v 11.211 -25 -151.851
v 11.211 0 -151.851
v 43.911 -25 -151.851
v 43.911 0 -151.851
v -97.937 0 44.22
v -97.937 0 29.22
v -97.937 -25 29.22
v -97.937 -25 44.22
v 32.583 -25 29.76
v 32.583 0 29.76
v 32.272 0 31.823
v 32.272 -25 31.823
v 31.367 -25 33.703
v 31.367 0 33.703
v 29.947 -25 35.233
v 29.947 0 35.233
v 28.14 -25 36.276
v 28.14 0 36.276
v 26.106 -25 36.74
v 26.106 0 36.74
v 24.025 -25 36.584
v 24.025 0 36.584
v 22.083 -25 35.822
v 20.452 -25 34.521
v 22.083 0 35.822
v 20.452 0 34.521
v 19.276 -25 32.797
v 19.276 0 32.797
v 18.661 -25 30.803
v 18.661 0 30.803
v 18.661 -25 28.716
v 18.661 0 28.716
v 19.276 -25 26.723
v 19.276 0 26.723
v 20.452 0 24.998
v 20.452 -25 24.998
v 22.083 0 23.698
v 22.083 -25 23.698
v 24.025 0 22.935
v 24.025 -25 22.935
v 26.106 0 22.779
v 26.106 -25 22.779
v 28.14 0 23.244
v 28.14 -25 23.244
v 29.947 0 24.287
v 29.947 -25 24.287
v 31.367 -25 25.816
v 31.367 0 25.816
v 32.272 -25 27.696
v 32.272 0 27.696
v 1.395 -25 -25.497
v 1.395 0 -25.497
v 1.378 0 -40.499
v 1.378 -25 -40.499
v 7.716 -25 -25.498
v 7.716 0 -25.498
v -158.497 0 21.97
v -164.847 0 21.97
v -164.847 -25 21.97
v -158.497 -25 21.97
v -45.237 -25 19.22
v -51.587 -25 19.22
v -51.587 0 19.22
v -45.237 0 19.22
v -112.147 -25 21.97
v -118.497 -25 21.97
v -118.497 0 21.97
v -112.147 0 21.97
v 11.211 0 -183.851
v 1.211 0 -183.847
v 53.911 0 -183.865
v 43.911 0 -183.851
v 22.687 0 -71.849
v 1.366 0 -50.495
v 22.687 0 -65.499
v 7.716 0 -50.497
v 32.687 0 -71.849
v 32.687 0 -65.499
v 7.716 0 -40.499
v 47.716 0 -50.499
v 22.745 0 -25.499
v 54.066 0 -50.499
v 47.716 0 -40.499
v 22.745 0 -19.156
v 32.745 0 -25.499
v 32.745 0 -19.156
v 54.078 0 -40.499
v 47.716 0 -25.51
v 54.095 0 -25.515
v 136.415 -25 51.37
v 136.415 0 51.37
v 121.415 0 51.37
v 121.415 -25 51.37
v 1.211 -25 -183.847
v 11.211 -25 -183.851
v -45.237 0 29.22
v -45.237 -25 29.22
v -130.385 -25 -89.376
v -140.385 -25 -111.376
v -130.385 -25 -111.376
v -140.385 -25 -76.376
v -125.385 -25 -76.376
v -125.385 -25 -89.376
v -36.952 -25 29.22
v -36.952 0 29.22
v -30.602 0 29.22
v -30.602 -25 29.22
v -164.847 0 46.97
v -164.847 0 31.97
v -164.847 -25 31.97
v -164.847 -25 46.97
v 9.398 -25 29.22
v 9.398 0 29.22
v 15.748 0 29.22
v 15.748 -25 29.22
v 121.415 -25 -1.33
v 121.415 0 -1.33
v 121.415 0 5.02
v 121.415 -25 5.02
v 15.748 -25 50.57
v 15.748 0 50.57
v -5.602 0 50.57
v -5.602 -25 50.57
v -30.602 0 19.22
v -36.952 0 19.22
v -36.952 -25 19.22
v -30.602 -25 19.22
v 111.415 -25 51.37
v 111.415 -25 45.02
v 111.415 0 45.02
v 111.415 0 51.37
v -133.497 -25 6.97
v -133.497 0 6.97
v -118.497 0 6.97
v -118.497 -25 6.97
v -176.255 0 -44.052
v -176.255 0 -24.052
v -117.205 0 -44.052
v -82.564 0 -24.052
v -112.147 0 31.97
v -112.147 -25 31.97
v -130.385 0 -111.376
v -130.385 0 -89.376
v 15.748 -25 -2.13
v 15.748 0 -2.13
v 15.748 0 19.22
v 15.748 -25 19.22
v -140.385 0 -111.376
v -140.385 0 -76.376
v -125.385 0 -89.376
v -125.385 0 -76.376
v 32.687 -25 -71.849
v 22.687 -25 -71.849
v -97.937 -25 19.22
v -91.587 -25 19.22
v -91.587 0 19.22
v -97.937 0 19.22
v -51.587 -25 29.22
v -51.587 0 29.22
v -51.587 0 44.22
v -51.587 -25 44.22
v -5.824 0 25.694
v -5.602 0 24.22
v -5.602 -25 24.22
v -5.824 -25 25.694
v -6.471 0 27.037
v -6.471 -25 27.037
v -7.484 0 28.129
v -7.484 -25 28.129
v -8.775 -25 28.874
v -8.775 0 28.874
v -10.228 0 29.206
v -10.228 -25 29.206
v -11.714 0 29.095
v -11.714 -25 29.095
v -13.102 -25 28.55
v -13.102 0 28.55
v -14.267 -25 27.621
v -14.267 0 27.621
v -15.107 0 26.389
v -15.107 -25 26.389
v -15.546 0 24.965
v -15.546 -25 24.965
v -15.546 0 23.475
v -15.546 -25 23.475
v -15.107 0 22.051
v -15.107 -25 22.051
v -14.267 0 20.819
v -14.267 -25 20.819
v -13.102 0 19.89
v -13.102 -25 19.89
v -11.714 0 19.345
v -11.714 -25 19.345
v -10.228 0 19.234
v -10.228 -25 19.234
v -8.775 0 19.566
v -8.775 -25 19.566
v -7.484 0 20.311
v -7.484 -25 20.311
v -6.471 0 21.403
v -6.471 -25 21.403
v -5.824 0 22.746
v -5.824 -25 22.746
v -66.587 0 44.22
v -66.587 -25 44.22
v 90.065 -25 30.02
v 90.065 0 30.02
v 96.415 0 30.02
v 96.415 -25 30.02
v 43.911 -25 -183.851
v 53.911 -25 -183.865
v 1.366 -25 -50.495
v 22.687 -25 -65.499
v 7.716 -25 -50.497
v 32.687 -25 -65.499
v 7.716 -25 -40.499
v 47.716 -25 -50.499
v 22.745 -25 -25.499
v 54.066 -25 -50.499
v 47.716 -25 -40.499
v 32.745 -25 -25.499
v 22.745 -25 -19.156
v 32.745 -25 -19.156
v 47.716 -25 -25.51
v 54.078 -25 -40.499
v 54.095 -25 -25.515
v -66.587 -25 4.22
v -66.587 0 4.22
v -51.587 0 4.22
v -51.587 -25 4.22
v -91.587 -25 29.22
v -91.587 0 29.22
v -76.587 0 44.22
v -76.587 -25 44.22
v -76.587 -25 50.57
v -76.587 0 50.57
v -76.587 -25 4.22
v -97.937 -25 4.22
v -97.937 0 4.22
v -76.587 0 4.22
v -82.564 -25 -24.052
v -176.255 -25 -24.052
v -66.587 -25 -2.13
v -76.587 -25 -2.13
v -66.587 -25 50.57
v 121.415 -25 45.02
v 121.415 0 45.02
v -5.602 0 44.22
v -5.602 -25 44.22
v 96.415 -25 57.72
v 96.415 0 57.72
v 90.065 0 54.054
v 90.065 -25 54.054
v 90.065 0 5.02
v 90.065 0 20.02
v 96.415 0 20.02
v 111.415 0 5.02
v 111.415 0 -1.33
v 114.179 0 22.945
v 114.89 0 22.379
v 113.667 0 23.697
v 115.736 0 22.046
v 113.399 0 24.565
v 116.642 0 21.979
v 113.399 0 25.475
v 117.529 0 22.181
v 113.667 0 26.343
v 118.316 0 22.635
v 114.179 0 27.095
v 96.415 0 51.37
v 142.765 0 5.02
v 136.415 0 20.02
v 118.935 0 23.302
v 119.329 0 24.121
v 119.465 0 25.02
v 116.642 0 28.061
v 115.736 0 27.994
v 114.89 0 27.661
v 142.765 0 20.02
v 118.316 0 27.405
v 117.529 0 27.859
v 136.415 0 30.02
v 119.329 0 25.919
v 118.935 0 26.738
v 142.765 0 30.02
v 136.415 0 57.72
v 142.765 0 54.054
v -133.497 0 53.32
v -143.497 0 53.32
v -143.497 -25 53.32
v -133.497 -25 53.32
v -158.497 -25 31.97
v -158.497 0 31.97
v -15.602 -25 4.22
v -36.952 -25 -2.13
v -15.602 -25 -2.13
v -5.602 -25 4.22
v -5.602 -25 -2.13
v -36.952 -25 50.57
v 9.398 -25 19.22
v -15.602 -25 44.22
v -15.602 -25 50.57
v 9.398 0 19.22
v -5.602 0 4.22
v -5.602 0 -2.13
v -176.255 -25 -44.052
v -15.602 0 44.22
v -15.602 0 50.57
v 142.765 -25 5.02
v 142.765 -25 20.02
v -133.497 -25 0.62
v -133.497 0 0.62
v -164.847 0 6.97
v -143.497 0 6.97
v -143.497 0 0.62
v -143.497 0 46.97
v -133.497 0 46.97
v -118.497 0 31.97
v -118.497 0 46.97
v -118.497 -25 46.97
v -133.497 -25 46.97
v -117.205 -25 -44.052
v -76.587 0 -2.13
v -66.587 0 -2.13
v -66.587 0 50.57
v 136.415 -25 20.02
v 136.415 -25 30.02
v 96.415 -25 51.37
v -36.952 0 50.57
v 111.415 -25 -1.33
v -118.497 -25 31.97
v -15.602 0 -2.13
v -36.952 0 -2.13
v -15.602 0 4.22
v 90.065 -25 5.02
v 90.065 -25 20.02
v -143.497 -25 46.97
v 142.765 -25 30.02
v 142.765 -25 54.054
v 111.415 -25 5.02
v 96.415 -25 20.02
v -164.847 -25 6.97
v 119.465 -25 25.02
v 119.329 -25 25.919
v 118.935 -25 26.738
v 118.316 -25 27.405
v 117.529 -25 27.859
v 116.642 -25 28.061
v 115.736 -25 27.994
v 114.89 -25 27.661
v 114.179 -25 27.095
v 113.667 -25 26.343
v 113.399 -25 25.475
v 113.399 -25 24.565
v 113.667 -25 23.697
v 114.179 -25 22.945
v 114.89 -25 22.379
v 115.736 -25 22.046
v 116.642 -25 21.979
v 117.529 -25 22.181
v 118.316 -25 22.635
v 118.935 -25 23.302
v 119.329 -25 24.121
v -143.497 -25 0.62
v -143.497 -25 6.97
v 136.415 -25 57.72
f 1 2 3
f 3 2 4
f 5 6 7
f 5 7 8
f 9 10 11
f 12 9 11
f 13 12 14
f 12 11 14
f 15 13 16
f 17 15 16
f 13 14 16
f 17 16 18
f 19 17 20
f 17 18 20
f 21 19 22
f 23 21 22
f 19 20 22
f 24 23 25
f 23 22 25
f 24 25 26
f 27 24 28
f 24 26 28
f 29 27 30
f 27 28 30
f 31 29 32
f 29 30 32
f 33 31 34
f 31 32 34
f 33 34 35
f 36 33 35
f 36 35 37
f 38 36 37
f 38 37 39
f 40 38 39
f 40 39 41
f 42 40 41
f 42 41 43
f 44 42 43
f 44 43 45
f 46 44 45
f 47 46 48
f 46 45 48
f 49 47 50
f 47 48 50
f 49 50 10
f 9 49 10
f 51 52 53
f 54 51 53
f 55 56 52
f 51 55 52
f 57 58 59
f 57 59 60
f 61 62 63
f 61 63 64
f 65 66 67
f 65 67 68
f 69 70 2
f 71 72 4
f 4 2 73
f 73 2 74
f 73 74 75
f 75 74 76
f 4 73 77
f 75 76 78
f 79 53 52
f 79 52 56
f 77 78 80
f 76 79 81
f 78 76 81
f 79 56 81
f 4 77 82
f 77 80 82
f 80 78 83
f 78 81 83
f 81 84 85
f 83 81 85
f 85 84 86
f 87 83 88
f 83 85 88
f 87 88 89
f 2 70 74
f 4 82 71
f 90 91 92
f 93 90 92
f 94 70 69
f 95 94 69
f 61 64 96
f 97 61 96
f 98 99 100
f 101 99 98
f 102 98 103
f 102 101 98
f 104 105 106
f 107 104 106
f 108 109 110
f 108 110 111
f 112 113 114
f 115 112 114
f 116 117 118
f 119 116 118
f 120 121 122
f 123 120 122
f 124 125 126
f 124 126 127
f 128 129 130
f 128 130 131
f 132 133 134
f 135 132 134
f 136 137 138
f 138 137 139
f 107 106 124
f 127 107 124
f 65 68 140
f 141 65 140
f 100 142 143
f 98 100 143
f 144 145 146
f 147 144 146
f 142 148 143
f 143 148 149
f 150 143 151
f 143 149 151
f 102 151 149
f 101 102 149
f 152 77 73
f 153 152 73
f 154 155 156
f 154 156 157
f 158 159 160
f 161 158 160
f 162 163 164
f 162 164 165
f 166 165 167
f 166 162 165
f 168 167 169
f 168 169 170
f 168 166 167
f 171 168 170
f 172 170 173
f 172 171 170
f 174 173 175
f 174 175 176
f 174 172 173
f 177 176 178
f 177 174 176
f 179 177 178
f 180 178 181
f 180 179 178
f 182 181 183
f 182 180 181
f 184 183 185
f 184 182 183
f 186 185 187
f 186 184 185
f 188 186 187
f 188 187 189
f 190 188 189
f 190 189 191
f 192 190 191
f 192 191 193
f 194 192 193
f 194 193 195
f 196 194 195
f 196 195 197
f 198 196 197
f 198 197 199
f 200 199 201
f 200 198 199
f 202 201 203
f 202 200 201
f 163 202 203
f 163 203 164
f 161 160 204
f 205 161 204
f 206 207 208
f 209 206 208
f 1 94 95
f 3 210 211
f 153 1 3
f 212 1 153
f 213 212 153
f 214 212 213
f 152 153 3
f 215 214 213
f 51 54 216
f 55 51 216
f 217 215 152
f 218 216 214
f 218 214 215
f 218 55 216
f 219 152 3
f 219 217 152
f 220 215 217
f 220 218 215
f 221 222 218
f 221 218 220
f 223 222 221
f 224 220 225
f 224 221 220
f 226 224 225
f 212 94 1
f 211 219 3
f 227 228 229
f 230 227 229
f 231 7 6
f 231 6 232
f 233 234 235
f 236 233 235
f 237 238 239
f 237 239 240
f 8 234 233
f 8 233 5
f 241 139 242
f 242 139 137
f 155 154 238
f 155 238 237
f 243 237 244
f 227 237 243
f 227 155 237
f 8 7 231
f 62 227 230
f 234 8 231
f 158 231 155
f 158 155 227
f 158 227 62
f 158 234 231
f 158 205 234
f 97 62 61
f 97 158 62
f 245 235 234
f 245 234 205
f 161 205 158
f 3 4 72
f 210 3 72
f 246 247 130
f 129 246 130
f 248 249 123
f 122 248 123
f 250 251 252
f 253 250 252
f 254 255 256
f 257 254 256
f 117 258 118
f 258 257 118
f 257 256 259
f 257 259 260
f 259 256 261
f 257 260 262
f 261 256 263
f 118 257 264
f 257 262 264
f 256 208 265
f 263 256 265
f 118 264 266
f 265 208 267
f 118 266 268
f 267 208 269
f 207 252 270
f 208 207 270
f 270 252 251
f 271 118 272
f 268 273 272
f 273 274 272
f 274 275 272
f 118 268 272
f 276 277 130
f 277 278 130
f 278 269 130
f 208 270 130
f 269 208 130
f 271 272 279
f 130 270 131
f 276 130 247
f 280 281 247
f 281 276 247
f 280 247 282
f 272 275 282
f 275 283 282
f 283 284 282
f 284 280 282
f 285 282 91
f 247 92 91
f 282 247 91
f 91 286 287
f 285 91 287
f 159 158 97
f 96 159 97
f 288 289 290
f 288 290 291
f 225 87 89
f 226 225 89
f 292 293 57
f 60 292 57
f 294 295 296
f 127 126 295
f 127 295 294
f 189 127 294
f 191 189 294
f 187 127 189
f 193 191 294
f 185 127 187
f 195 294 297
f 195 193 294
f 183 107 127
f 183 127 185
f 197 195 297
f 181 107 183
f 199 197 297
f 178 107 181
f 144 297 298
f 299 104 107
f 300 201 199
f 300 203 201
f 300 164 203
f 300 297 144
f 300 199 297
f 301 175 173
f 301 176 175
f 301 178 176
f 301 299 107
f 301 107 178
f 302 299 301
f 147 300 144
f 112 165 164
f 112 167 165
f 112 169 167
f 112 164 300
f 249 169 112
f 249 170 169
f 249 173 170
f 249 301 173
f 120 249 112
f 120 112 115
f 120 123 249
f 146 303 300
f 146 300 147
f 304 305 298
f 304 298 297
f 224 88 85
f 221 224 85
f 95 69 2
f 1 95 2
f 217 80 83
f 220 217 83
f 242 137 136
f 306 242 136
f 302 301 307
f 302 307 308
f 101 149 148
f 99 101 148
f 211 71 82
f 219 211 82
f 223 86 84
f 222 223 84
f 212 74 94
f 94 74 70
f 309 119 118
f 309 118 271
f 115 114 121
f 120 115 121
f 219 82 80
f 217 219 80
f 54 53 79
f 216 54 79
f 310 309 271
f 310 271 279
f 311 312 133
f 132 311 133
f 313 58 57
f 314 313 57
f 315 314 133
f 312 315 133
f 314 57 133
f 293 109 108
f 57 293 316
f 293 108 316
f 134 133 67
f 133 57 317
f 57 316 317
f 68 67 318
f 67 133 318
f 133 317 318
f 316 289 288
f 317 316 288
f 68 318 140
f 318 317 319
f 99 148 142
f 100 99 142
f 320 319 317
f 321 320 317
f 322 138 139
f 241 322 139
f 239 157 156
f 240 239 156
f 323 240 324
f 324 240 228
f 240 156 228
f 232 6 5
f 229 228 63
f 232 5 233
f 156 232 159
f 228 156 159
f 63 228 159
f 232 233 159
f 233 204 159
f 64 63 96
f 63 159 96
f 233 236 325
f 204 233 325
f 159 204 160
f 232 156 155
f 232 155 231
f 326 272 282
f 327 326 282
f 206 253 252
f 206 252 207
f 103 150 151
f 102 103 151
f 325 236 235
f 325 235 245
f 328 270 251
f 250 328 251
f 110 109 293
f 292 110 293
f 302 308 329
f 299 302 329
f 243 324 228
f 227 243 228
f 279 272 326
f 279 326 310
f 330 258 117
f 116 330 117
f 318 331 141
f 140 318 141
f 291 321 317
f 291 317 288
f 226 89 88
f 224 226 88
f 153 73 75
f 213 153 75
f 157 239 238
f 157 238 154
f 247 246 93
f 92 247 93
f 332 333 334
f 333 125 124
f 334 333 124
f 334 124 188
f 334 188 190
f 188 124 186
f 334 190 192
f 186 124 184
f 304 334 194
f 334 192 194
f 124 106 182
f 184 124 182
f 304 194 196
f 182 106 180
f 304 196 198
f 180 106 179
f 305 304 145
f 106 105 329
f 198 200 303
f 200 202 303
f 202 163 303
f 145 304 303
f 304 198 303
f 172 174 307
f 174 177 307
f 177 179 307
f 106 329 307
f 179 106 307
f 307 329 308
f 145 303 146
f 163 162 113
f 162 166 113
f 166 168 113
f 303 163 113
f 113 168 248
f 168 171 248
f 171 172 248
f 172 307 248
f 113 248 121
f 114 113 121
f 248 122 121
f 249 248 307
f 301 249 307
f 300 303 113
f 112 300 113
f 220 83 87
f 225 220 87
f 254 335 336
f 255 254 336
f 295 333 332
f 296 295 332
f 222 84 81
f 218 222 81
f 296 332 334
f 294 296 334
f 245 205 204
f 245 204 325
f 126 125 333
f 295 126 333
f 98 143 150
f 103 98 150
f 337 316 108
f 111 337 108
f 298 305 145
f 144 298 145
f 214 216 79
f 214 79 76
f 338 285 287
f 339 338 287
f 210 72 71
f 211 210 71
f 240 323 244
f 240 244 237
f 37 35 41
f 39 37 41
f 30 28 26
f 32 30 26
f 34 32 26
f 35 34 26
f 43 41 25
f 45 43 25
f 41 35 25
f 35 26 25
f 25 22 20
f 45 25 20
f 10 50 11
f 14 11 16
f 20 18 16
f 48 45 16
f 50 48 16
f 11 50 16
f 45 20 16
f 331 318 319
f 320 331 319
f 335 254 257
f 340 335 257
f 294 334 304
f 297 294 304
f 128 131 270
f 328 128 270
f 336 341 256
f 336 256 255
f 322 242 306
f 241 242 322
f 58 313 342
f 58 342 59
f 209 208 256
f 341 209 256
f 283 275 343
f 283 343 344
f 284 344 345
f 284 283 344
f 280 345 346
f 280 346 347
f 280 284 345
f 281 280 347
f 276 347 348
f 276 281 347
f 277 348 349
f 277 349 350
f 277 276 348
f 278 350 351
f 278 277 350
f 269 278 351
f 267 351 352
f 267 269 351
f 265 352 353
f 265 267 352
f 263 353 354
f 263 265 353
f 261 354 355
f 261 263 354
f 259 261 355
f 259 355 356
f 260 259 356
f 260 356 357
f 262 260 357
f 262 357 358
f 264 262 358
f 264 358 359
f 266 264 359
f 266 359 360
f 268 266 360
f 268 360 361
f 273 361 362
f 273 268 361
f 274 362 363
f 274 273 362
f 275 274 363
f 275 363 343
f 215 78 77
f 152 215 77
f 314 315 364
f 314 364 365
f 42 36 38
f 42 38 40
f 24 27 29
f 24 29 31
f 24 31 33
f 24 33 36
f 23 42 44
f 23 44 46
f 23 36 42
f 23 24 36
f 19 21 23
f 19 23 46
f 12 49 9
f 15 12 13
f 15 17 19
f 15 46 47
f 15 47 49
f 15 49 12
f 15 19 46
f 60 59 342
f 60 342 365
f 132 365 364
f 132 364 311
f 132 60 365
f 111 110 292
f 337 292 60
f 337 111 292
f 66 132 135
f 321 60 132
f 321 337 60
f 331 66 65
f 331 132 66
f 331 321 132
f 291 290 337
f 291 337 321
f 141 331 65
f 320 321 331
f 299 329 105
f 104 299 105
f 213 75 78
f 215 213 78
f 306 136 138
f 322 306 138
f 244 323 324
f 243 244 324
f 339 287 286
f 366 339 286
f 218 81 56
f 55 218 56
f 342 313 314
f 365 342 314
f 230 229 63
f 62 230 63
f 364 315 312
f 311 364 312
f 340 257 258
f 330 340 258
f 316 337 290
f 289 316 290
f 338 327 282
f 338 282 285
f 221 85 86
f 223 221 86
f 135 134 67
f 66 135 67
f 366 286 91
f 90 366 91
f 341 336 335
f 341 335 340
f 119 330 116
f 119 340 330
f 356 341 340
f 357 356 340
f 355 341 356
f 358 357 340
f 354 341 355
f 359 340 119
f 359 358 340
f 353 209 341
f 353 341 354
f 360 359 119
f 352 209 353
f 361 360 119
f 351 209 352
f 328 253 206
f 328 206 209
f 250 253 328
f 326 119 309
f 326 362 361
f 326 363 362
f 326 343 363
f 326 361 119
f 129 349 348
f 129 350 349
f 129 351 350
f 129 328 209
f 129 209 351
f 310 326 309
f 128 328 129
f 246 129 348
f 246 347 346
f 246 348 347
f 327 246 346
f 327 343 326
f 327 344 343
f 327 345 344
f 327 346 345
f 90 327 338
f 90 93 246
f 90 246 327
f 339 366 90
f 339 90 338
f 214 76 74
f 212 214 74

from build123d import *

# Parameters (mm, degrees)
F1_DEPTH = 25
F0_W     = 6.35
F0_H     = 10
F0_W_2   = 10
F0_H_2   = 6.35
F0_H_3   = 15
F0_R     = 5
F0_W_3   = 15
F0_R_2   = 3.05
F0_H_4   = 6.4862936566
F0_R_3   = 7
F0_W_4   = 5
F0_H_5   = 13


with BuildPart() as f1:
    # F0 (on Front) → F1 (new body)
    with BuildSketch(Plane.XZ):
        Polygon((7.716040658, -25.4975720675), (1.3951481077, -25.4969244297), (1.3777217764, -40.4991119474), (7.716040658, -40.4991119474), align=None)
        Polygon((27.677680377, -71.8491119474), (27.5612143982, -151.8505732841), (43.9112177113, -151.8505732841), (43.9112177113, -183.8505732841), (53.9112079293, -183.8650558751), (54.0661239456, -50.4991119474), (47.716040658, -50.4991119474), (47.716040658, -65.4991119474), (32.6869246952, -65.4991119474), (32.6869246952, -71.8491119474), align=None)
        Polygon((47.716040658, -50.4991119474), (47.716040658, -40.4991119474), (41.3542775405, -40.4991119474), (41.3543415102, -50.4991119474), align=None)
        Polygon((14.0577217764, -40.4991119474), (7.716040658, -40.4991119474), (7.716040658, -50.4969808545), (14.0543595396, -50.4991119474), align=None)
        Polygon((22.7451465298, -25.4991119474), (7.716040658, -25.4975720675), (7.716040658, -40.4991119474), (14.0577217764, -40.4991119474), (14.0543595396, -50.4991119474), (7.716040658, -50.4969808545), (7.716040658, -65.4991119474), (22.6869246952, -65.4991119474), (22.6869246952, -59.1491119474), (27.6961690134, -59.1491119474), (32.6869246952, -59.1491119474), (32.6869246952, -65.4991119474), (47.716040658, -65.4991119474), (47.716040658, -50.4991119474), (41.3543415102, -50.4991119474), (41.3542775405, -40.4991119474), (47.716040658, -40.4991119474), (47.716040658, -25.5103669452), (32.7451465298, -25.4991119474), (32.7451465298, -19.1560435671), (22.7451465298, -19.1560435671), align=None)
        Polygon((27.6961690134, -59.1491119474), (27.6869246952, -65.4991119474), (32.6869246952, -65.4991119474), (32.6869246952, -59.1491119474), align=None)
        Polygon((22.6869246952, -59.1491119474), (22.6869246952, -65.4991119474), (27.6869246952, -65.4991119474), (27.6961690134, -59.1491119474), align=None)
        Polygon((7.716040658, -50.4969808545), (1.3661108716, -50.4948458577), (1.2112110852, -183.8468176004), (11.2112110852, -183.8505732841), (11.2112110852, -151.8505732841), (27.5612143982, -151.8505732841), (27.677680377, -71.8491119474), (22.6869246952, -71.8491119474), (22.6869246952, -65.4991119474), (7.716040658, -65.4991119474), align=None)
        Polygon((54.0951449518, -25.5151627044), (47.716040658, -25.5103669452), (47.716040658, -40.4991119474), (54.0777398058, -40.4991119474), align=None)
    extrude(amount=F1_DEPTH)


with BuildPart() as f1b:
    # F0 (on Front) → F1, piece 2 (new body)
    with BuildSketch(Plane.XZ):
        Polygon((-133.4972210269, 6.9699799252), (-118.4972210269, 6.9699799252), (-118.4972210269, 21.9699799252), (-124.8472210269, 21.9699799252), (-124.8472210269, 31.9699799252), (-118.4972210269, 31.9699799252), (-118.4972210269, 46.9699799252), (-133.4972210269, 46.9699799252), (-133.4972210269, 40.6199799252), (-143.4972210269, 40.6199799252), (-143.4972210269, 46.9699799252), (-158.4972210269, 46.9699799252), (-158.4972210269, 31.9699799252), (-152.1472210269, 31.9699799252), (-152.1472210269, 21.9699799252), (-158.4972210269, 21.9699799252), (-158.4972210269, 6.9699799252), (-143.4972210269, 6.9699799252), (-143.4972210269, 13.3199799252), (-133.4972210269, 13.3199799252), align=None)
        with Locations((-155.3222210269, 26.9699799252)):
            Rectangle(F0_W, F0_H)
        with Locations((-138.4972210269, 10.1449799252)):
            Rectangle(F0_W_2, F0_H_2)
        with Locations((-121.6722210269, 26.9699799252)):
            Rectangle(F0_W, F0_H)
        with Locations((-138.4972210269, 43.7949799252)):
            Rectangle(F0_W_2, F0_H_2)
        with Locations((-138.4972210269, 3.7949799252)):
            Rectangle(F0_W_2, F0_H_2)
        with Locations((-161.6722210269, 39.4699799252)):
            Rectangle(F0_W, F0_H_3)
        with Locations((-161.6722210269, 14.4699799252)):
            Rectangle(F0_W, F0_H_3)
        with Locations((-138.4972210269, 50.1449799252)):
            Rectangle(F0_W_2, F0_H_2)
        with Locations((-115.3222210269, 26.9699799252)):
            Rectangle(F0_W, F0_H)
    extrude(amount=F1_DEPTH)


with BuildPart() as f1c:
    # F0 (on Front) → F1, piece 3 (new body)
    with BuildSketch(Plane.XZ):
        with Locations((-94.7615902387, 36.7200101991)):
            Rectangle(F0_W, F0_H_3)
        with Locations((-94.7615902387, 11.7200101991)):
            Rectangle(F0_W, F0_H_3)
        Polygon((-66.5865902387, 4.2200101991), (-51.5865902387, 4.2200101991), (-51.5865902387, 19.2200101991), (-57.9365902387, 19.2200101991), (-57.9365902387, 29.2200101991), (-51.5865902387, 29.2200101991), (-51.5865902387, 44.2200101991), (-66.5865902387, 44.2200101991), (-66.5865902387, 37.8700101991), (-76.5865902387, 37.8700101991), (-76.5865902387, 44.2200101991), (-91.5865902387, 44.2200101991), (-91.5865902387, 29.2200101991), (-85.2365902387, 29.2200101991), (-85.2365902387, 19.2200101991), (-91.5865902387, 19.2200101991), (-91.5865902387, 4.2200101991), (-76.5865902387, 4.2200101991), (-76.5865902387, 10.5700101991), (-66.5865902387, 10.5700101991), align=None)
        with Locations((-71.5865902387, 41.0450101991)):
            Rectangle(F0_W_2, F0_H_2)
        with Locations((-71.5865902387, 47.3950101991)):
            Rectangle(F0_W_2, F0_H_2)
        with Locations((-54.7615902387, 24.2200101991)):
            Rectangle(F0_W, F0_H)
        with Locations((-48.4115902387, 24.2200101991)):
            Rectangle(F0_W, F0_H)
        with Locations((-71.5865902387, 7.3950101991)):
            Rectangle(F0_W_2, F0_H_2)
        with Locations((-71.5865902387, 1.0450101991)):
            Rectangle(F0_W_2, F0_H_2)
        with Locations((-88.4115902387, 24.2200101991)):
            Rectangle(F0_W, F0_H)
    extrude(amount=F1_DEPTH)


with BuildPart() as f1d:
    # F0 (on Front) → F1, piece 4 (new body)
    with BuildSketch(Plane.XZ):
        Polygon((-5.6017105066, 4.2200101991), (9.3982894934, 4.2200101991), (9.3982894934, 19.2200101991), (3.0482894934, 19.2200101991), (3.0482894934, 29.2200101991), (9.3982894934, 29.2200101991), (9.3982894934, 44.2200101991), (-5.6017105066, 44.2200101991), (-5.6017105066, 37.8700101991), (-15.6017105066, 37.8700101991), (-15.6017105066, 44.2200101991), (-30.6017105066, 44.2200101991), (-30.6017105066, 29.2200101991), (-24.2517105066, 29.2200101991), (-24.2517105066, 19.2200101991), (-30.6017105066, 19.2200101991), (-30.6017105066, 4.2200101991), (-15.6017105066, 4.2200101991), (-15.6017105066, 10.5700101991), (-5.6017105066, 10.5700101991), align=None)
        with Locations((-10.6017105066, 24.2200101991)):
            Circle(F0_R, mode=Mode.SUBTRACT)
        with Locations((-27.4267105066, 24.2200101991)):
            Rectangle(F0_W, F0_H)
        with Locations((-33.7767105066, 11.7200101991)):
            Rectangle(F0_W, F0_H_3)
        with Locations((6.2232894934, 24.2200101991)):
            Rectangle(F0_W, F0_H)
        with Locations((-10.6017105066, 41.0450101991)):
            Rectangle(F0_W_2, F0_H_2)
        with Locations((-10.6017105066, 7.3950101991)):
            Rectangle(F0_W_2, F0_H_2)
        with Locations((-33.7767105066, 47.3950101991)):
            Rectangle(F0_W, F0_H_2)
        with Locations((-33.7767105066, 36.7200101991)):
            Rectangle(F0_W, F0_H_3)
        with Locations((-23.1017105066, 47.3950101991)):
            Rectangle(F0_W_3, F0_H_2)
        with Locations((1.8982894934, 47.3950101991)):
            Rectangle(F0_W_3, F0_H_2)
        with Locations((12.5732894934, 47.3950101991)):
            Rectangle(F0_W, F0_H_2)
        with Locations((12.5732894934, 36.7200101991)):
            Rectangle(F0_W, F0_H_3)
        with Locations((12.5732894934, 11.7200101991)):
            Rectangle(F0_W, F0_H_3)
        with Locations((12.5732894934, 1.0450101991)):
            Rectangle(F0_W, F0_H_2)
        with Locations((1.8982894934, 1.0450101991)):
            Rectangle(F0_W_3, F0_H_2)
        with Locations((-23.1017105066, 1.0450101991)):
            Rectangle(F0_W_3, F0_H_2)
        with Locations((-33.7767105066, 1.0450101991)):
            Rectangle(F0_W, F0_H_2)
    extrude(amount=F1_DEPTH)


with BuildPart() as f1e:
    # F0 (on Front) → F1, piece 5 (new body)
    with BuildSketch(Plane.XZ):
        with Locations((116.4145616193, 1.8449799252)):
            Rectangle(F0_W_2, F0_H_2)
        with Locations((116.4145616193, 8.1949799252)):
            Rectangle(F0_W_2, F0_H_2)
        Polygon((121.4145616193, 5.0199799252), (136.4145616193, 5.0199799252), (136.4145616193, 20.0199799252), (130.0645616193, 20.0199799252), (130.0645616193, 30.0199799252), (136.4145616193, 30.0199799252), (136.4145616193, 45.0199799252), (121.4145616193, 45.0199799252), (121.4145616193, 38.5336862686), (111.4145616193, 38.5336862686), (111.4145616193, 45.0199799252), (96.4145616193, 45.0199799252), (96.4145616193, 30.0199799252), (102.7645616193, 30.0199799252), (102.7645616193, 20.0199799252), (96.4145616193, 20.0199799252), (96.4145616193, 5.0199799252), (111.4145616193, 5.0199799252), (111.4145616193, 11.3699799252), (121.4145616193, 11.3699799252), align=None)
        with Locations((116.4145616193, 25.0199799252)):
            Circle(F0_R_2, mode=Mode.SUBTRACT)
        with Locations((93.2395616193, 12.5199799252)):
            Rectangle(F0_W, F0_H_3)
        with Locations((99.5895616193, 25.0199799252)):
            Rectangle(F0_W, F0_H)
        Polygon((90.0645616193, 30.0199799252), (96.4145616193, 30.0199799252), (96.4145616193, 45.0199799252), (96.4145616193, 51.3699799252), (90.0645616193, 51.3699799252), align=None)
        with Locations((116.4145616193, 41.7768330969)):
            Rectangle(F0_W_2, F0_H_4)
        with Locations((103.9145616193, 48.1949799252)):
            Rectangle(F0_W_3, F0_H_2)
        with Locations((128.9145616193, 48.1949799252)):
            Rectangle(F0_W_3, F0_H_2)
        with Locations((133.2395616193, 25.0199799252)):
            Rectangle(F0_W, F0_H)
        with Locations((139.5895616193, 12.5199799252)):
            Rectangle(F0_W, F0_H_3)
        Polygon((136.4145616193, 30.0199799252), (142.7645616193, 30.0199799252), (142.7645616193, 51.3699799252), (136.4145616193, 51.3699799252), (136.4145616193, 45.0199799252), align=None)
        Polygon((136.4145616193, 51.3699799252), (142.7645616193, 51.3699799252), (142.7645616193, 54.0538057158), (136.4145616193, 57.7199799252), align=None)
        Polygon((96.4145616193, 51.3699799252), (96.4145616193, 57.7199799252), (90.0645616193, 54.0538057158), (90.0645616193, 51.3699799252), align=None)
    extrude(amount=F1_DEPTH)


with BuildPart() as f1f:
    # F0 (on Front) → F1, piece 6 (new body)
    with BuildSketch(Plane.XZ):
        with Locations((25.5829133093, 29.7596957535)):
            Circle(F0_R_3)
    extrude(amount=F1_DEPTH)


with BuildPart() as f1g:
    # F0 (on Front) → F1, piece 7 (new body)
    with BuildSketch(Plane.XZ):
        Polygon((-176.2549936652, -44.0515466034), (-117.2049936652, -44.0515466034), (-82.5639775138, -24.0515466034), (-176.2549936652, -24.0515466034), align=None)
    extrude(amount=F1_DEPTH)


with BuildPart() as f1h:
    # F0 (on Front) → F1, piece 8 (new body)
    with BuildSketch(Plane.XZ):
        Polygon((-140.3850317001, -111.3759502769), (-130.3850317001, -111.3759502769), (-130.3850317001, -89.3759502769), (-130.3850317001, -76.3759502769), (-140.3850317001, -76.3759502769), align=None)
        with Locations((-127.8850317001, -82.8759502769)):
            Rectangle(F0_W_4, F0_H_5)
    extrude(amount=F1_DEPTH)


solid = Compound([f1.part, f1b.part, f1c.part, f1d.part, f1e.part, f1f.part, f1g.part, f1h.part])
